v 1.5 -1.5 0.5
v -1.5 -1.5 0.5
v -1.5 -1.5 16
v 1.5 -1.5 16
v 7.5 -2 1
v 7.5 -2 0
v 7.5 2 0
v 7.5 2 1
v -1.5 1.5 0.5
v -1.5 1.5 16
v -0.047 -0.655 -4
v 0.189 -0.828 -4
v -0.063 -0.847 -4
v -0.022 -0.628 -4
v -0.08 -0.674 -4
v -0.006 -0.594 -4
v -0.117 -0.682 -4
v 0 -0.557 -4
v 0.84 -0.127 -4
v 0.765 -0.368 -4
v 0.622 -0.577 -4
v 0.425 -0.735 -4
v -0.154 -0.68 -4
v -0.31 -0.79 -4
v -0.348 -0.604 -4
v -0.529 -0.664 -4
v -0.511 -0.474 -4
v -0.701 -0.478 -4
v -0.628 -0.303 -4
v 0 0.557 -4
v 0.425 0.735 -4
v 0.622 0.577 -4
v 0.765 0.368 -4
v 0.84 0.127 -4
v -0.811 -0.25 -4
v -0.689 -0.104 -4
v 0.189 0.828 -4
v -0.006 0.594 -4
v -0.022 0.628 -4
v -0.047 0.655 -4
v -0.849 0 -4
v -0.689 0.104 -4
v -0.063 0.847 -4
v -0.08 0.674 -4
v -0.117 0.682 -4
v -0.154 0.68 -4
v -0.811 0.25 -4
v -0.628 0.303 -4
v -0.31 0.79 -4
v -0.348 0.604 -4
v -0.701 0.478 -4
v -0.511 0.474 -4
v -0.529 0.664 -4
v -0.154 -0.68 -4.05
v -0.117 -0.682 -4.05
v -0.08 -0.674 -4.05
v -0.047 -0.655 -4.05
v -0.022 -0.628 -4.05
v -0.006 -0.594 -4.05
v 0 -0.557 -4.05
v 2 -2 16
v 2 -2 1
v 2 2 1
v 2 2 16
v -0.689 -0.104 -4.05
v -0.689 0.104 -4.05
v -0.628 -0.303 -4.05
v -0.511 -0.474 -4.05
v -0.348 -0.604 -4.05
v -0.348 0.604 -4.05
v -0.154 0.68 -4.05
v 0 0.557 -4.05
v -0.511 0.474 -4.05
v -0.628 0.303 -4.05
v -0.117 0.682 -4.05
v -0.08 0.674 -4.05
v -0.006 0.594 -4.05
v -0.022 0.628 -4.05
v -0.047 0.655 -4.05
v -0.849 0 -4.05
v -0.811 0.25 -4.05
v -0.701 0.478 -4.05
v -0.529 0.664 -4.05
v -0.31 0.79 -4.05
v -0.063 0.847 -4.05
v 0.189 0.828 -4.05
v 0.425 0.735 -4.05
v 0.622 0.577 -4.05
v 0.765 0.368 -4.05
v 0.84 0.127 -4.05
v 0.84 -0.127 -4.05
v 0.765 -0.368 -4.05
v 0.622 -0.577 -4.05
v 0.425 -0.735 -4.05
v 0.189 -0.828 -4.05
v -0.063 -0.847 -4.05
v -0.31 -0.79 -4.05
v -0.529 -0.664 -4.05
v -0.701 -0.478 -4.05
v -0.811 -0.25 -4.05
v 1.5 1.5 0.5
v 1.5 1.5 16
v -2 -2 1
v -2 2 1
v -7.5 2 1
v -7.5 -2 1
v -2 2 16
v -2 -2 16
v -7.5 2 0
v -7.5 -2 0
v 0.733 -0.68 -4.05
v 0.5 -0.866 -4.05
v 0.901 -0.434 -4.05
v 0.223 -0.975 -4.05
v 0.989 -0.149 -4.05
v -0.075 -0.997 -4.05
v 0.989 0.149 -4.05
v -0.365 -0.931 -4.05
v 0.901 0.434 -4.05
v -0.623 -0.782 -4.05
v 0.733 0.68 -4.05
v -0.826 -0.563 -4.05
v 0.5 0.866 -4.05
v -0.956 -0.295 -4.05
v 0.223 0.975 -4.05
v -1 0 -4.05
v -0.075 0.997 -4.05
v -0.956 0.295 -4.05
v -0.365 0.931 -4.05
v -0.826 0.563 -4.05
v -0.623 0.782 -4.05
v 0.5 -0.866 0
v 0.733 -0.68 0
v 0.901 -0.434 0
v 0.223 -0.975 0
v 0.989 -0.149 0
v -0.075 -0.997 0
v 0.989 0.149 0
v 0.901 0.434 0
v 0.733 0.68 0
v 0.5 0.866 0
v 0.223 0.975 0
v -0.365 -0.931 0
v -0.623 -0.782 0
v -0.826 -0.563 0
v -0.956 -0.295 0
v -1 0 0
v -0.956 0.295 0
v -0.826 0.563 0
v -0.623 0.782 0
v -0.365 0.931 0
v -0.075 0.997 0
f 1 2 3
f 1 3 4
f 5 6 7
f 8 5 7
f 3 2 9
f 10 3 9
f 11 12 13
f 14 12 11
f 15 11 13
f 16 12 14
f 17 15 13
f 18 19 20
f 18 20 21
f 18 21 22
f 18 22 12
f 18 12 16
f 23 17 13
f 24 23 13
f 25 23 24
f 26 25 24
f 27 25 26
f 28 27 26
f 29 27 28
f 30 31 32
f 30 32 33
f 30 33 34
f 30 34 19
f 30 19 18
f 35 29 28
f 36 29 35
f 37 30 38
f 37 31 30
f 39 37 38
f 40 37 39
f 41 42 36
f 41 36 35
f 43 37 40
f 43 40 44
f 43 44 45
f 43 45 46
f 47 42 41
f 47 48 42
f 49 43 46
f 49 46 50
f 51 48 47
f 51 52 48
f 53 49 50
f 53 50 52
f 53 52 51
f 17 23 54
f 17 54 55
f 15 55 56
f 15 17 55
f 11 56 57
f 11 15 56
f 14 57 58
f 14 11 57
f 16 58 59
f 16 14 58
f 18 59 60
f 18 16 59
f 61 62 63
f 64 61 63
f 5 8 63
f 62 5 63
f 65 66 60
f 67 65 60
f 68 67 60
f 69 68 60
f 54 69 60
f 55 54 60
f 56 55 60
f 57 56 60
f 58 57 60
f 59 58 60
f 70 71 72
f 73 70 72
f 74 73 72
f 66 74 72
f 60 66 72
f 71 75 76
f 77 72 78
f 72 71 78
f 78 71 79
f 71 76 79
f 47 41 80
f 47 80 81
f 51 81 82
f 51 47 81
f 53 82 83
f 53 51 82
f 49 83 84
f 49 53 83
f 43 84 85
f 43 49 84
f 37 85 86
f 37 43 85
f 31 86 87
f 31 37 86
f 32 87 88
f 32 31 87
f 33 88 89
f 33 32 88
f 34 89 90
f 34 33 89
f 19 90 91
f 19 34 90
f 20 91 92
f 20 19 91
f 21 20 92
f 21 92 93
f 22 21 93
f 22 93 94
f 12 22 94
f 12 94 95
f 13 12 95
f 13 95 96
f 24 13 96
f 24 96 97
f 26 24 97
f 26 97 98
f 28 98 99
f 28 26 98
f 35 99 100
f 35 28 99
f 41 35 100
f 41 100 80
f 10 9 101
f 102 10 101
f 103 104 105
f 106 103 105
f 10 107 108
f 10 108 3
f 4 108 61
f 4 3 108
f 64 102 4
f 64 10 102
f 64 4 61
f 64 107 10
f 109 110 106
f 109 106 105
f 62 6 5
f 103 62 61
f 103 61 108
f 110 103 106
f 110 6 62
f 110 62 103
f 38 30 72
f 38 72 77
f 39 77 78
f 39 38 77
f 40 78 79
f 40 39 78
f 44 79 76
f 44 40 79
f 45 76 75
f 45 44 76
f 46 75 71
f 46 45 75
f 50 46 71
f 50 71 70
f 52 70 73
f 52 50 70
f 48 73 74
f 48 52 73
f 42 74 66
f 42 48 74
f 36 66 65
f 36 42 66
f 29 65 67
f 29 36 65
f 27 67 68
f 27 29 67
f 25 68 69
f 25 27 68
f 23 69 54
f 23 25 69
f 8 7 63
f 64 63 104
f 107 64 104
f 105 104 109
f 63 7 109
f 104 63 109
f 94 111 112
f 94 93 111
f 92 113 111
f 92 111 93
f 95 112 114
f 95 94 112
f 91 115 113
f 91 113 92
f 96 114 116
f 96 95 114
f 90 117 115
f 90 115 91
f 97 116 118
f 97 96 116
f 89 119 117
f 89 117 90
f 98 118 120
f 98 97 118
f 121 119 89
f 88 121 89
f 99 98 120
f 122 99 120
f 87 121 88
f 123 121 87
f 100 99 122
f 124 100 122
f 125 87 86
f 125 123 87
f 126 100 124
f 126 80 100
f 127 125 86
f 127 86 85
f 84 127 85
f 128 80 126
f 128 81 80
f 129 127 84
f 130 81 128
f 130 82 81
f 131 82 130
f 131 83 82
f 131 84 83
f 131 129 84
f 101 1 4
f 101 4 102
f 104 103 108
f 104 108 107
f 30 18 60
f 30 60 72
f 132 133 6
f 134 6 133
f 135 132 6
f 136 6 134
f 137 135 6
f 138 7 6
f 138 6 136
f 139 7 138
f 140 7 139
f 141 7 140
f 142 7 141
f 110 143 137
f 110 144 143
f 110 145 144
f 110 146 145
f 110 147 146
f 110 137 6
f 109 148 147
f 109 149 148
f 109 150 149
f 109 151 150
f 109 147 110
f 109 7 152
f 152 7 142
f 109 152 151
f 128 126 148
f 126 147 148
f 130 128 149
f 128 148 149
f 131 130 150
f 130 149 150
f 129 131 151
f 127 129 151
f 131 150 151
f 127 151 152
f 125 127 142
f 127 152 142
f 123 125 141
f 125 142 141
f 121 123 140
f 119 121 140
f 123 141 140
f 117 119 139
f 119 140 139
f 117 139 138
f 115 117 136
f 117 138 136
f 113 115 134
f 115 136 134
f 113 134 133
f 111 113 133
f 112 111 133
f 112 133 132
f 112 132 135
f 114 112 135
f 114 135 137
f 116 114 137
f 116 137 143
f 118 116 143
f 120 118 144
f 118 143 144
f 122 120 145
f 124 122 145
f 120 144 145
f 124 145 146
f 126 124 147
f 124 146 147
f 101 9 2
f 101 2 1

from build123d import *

# Parameters (mm, degrees)
SKETCH_8_W      = 4
SKETCH_8_H      = 4
EXTRUDE_5_DEPTH = 16
SHELL_2_T       = -0.5
SKETCH_9_R      = 1
EXTRUDE_6_DEPTH = 4
SKETCH_10_R     = 1
SKETCH_10_R_2   = 0.849026748
EXTRUDE_7_DEPTH = 0.05
SKETCH_11_W     = 5.5
SKETCH_11_H     = 4
EXTRUDE_8_DEPTH = 1


with BuildPart() as part:
    # Эскиз8 → Бобышка-Вытянуть5 (new body)
    with BuildSketch(Plane.XY):
        Rectangle(SKETCH_8_W, SKETCH_8_H)
    extrude(amount=EXTRUDE_5_DEPTH)

    # Оболочка2
    shell_2_openings = [part.faces().sort_by_distance(p)[0] for p in [
        (0, 0, 16),
    ]]
    offset(amount=SHELL_2_T, openings=shell_2_openings, kind=Kind.INTERSECTION)

    # Эскиз9 → Бобышка-Вытянуть6 (add)
    with BuildSketch(Plane(origin=(0, 0, 0), x_dir=(-1, 0, 0), z_dir=(0, 0, -1))):
        Circle(SKETCH_9_R)
    extrude(amount=EXTRUDE_6_DEPTH)

    # Эскиз10 → Бобышка-Вытянуть7 (add)
    # profile 1 of 2: a face of its own
    with BuildSketch(Plane(origin=(0, 0, -4), x_dir=(-1, 0, 0), z_dir=(0, 0, -1))):
        Circle(SKETCH_10_R)
        Circle(SKETCH_10_R_2, mode=Mode.SUBTRACT)
    # profile 2 of 2: a face of its own
    with BuildSketch(Plane(origin=(0, 0, -4), x_dir=(-1, 0, 0), z_dir=(0, 0, -1))):
        with BuildLine():
            ThreePointArc((0, 0.556564641), (0.047474291, 0.655228966), (0.15419684, 0.679698432))
            ThreePointArc((0.15419684, 0.679698432), (0.6969696, 0), (0.15419684, -0.679698432))
            ThreePointArc((0.15419684, -0.679698432), (0.047474291, -0.655228966), (0, -0.556564641))
            Line((0, -0.556564641), (0, 0.556564641))
        make_face()
    extrude(amount=EXTRUDE_7_DEPTH)

    # Эскиз11 → Бобышка-Вытянуть8 (add)
    with BuildSketch(Plane(origin=(0, 0, 0), x_dir=(-1, 0, 0), z_dir=(0, 0, -1))):
        with Locations((-4.75, 0)):
            Rectangle(SKETCH_11_W, SKETCH_11_H)
        with Locations((4.75, 0)):
            Rectangle(SKETCH_11_W, SKETCH_11_H)
    extrude(amount=-EXTRUDE_8_DEPTH)


solid = part.part
